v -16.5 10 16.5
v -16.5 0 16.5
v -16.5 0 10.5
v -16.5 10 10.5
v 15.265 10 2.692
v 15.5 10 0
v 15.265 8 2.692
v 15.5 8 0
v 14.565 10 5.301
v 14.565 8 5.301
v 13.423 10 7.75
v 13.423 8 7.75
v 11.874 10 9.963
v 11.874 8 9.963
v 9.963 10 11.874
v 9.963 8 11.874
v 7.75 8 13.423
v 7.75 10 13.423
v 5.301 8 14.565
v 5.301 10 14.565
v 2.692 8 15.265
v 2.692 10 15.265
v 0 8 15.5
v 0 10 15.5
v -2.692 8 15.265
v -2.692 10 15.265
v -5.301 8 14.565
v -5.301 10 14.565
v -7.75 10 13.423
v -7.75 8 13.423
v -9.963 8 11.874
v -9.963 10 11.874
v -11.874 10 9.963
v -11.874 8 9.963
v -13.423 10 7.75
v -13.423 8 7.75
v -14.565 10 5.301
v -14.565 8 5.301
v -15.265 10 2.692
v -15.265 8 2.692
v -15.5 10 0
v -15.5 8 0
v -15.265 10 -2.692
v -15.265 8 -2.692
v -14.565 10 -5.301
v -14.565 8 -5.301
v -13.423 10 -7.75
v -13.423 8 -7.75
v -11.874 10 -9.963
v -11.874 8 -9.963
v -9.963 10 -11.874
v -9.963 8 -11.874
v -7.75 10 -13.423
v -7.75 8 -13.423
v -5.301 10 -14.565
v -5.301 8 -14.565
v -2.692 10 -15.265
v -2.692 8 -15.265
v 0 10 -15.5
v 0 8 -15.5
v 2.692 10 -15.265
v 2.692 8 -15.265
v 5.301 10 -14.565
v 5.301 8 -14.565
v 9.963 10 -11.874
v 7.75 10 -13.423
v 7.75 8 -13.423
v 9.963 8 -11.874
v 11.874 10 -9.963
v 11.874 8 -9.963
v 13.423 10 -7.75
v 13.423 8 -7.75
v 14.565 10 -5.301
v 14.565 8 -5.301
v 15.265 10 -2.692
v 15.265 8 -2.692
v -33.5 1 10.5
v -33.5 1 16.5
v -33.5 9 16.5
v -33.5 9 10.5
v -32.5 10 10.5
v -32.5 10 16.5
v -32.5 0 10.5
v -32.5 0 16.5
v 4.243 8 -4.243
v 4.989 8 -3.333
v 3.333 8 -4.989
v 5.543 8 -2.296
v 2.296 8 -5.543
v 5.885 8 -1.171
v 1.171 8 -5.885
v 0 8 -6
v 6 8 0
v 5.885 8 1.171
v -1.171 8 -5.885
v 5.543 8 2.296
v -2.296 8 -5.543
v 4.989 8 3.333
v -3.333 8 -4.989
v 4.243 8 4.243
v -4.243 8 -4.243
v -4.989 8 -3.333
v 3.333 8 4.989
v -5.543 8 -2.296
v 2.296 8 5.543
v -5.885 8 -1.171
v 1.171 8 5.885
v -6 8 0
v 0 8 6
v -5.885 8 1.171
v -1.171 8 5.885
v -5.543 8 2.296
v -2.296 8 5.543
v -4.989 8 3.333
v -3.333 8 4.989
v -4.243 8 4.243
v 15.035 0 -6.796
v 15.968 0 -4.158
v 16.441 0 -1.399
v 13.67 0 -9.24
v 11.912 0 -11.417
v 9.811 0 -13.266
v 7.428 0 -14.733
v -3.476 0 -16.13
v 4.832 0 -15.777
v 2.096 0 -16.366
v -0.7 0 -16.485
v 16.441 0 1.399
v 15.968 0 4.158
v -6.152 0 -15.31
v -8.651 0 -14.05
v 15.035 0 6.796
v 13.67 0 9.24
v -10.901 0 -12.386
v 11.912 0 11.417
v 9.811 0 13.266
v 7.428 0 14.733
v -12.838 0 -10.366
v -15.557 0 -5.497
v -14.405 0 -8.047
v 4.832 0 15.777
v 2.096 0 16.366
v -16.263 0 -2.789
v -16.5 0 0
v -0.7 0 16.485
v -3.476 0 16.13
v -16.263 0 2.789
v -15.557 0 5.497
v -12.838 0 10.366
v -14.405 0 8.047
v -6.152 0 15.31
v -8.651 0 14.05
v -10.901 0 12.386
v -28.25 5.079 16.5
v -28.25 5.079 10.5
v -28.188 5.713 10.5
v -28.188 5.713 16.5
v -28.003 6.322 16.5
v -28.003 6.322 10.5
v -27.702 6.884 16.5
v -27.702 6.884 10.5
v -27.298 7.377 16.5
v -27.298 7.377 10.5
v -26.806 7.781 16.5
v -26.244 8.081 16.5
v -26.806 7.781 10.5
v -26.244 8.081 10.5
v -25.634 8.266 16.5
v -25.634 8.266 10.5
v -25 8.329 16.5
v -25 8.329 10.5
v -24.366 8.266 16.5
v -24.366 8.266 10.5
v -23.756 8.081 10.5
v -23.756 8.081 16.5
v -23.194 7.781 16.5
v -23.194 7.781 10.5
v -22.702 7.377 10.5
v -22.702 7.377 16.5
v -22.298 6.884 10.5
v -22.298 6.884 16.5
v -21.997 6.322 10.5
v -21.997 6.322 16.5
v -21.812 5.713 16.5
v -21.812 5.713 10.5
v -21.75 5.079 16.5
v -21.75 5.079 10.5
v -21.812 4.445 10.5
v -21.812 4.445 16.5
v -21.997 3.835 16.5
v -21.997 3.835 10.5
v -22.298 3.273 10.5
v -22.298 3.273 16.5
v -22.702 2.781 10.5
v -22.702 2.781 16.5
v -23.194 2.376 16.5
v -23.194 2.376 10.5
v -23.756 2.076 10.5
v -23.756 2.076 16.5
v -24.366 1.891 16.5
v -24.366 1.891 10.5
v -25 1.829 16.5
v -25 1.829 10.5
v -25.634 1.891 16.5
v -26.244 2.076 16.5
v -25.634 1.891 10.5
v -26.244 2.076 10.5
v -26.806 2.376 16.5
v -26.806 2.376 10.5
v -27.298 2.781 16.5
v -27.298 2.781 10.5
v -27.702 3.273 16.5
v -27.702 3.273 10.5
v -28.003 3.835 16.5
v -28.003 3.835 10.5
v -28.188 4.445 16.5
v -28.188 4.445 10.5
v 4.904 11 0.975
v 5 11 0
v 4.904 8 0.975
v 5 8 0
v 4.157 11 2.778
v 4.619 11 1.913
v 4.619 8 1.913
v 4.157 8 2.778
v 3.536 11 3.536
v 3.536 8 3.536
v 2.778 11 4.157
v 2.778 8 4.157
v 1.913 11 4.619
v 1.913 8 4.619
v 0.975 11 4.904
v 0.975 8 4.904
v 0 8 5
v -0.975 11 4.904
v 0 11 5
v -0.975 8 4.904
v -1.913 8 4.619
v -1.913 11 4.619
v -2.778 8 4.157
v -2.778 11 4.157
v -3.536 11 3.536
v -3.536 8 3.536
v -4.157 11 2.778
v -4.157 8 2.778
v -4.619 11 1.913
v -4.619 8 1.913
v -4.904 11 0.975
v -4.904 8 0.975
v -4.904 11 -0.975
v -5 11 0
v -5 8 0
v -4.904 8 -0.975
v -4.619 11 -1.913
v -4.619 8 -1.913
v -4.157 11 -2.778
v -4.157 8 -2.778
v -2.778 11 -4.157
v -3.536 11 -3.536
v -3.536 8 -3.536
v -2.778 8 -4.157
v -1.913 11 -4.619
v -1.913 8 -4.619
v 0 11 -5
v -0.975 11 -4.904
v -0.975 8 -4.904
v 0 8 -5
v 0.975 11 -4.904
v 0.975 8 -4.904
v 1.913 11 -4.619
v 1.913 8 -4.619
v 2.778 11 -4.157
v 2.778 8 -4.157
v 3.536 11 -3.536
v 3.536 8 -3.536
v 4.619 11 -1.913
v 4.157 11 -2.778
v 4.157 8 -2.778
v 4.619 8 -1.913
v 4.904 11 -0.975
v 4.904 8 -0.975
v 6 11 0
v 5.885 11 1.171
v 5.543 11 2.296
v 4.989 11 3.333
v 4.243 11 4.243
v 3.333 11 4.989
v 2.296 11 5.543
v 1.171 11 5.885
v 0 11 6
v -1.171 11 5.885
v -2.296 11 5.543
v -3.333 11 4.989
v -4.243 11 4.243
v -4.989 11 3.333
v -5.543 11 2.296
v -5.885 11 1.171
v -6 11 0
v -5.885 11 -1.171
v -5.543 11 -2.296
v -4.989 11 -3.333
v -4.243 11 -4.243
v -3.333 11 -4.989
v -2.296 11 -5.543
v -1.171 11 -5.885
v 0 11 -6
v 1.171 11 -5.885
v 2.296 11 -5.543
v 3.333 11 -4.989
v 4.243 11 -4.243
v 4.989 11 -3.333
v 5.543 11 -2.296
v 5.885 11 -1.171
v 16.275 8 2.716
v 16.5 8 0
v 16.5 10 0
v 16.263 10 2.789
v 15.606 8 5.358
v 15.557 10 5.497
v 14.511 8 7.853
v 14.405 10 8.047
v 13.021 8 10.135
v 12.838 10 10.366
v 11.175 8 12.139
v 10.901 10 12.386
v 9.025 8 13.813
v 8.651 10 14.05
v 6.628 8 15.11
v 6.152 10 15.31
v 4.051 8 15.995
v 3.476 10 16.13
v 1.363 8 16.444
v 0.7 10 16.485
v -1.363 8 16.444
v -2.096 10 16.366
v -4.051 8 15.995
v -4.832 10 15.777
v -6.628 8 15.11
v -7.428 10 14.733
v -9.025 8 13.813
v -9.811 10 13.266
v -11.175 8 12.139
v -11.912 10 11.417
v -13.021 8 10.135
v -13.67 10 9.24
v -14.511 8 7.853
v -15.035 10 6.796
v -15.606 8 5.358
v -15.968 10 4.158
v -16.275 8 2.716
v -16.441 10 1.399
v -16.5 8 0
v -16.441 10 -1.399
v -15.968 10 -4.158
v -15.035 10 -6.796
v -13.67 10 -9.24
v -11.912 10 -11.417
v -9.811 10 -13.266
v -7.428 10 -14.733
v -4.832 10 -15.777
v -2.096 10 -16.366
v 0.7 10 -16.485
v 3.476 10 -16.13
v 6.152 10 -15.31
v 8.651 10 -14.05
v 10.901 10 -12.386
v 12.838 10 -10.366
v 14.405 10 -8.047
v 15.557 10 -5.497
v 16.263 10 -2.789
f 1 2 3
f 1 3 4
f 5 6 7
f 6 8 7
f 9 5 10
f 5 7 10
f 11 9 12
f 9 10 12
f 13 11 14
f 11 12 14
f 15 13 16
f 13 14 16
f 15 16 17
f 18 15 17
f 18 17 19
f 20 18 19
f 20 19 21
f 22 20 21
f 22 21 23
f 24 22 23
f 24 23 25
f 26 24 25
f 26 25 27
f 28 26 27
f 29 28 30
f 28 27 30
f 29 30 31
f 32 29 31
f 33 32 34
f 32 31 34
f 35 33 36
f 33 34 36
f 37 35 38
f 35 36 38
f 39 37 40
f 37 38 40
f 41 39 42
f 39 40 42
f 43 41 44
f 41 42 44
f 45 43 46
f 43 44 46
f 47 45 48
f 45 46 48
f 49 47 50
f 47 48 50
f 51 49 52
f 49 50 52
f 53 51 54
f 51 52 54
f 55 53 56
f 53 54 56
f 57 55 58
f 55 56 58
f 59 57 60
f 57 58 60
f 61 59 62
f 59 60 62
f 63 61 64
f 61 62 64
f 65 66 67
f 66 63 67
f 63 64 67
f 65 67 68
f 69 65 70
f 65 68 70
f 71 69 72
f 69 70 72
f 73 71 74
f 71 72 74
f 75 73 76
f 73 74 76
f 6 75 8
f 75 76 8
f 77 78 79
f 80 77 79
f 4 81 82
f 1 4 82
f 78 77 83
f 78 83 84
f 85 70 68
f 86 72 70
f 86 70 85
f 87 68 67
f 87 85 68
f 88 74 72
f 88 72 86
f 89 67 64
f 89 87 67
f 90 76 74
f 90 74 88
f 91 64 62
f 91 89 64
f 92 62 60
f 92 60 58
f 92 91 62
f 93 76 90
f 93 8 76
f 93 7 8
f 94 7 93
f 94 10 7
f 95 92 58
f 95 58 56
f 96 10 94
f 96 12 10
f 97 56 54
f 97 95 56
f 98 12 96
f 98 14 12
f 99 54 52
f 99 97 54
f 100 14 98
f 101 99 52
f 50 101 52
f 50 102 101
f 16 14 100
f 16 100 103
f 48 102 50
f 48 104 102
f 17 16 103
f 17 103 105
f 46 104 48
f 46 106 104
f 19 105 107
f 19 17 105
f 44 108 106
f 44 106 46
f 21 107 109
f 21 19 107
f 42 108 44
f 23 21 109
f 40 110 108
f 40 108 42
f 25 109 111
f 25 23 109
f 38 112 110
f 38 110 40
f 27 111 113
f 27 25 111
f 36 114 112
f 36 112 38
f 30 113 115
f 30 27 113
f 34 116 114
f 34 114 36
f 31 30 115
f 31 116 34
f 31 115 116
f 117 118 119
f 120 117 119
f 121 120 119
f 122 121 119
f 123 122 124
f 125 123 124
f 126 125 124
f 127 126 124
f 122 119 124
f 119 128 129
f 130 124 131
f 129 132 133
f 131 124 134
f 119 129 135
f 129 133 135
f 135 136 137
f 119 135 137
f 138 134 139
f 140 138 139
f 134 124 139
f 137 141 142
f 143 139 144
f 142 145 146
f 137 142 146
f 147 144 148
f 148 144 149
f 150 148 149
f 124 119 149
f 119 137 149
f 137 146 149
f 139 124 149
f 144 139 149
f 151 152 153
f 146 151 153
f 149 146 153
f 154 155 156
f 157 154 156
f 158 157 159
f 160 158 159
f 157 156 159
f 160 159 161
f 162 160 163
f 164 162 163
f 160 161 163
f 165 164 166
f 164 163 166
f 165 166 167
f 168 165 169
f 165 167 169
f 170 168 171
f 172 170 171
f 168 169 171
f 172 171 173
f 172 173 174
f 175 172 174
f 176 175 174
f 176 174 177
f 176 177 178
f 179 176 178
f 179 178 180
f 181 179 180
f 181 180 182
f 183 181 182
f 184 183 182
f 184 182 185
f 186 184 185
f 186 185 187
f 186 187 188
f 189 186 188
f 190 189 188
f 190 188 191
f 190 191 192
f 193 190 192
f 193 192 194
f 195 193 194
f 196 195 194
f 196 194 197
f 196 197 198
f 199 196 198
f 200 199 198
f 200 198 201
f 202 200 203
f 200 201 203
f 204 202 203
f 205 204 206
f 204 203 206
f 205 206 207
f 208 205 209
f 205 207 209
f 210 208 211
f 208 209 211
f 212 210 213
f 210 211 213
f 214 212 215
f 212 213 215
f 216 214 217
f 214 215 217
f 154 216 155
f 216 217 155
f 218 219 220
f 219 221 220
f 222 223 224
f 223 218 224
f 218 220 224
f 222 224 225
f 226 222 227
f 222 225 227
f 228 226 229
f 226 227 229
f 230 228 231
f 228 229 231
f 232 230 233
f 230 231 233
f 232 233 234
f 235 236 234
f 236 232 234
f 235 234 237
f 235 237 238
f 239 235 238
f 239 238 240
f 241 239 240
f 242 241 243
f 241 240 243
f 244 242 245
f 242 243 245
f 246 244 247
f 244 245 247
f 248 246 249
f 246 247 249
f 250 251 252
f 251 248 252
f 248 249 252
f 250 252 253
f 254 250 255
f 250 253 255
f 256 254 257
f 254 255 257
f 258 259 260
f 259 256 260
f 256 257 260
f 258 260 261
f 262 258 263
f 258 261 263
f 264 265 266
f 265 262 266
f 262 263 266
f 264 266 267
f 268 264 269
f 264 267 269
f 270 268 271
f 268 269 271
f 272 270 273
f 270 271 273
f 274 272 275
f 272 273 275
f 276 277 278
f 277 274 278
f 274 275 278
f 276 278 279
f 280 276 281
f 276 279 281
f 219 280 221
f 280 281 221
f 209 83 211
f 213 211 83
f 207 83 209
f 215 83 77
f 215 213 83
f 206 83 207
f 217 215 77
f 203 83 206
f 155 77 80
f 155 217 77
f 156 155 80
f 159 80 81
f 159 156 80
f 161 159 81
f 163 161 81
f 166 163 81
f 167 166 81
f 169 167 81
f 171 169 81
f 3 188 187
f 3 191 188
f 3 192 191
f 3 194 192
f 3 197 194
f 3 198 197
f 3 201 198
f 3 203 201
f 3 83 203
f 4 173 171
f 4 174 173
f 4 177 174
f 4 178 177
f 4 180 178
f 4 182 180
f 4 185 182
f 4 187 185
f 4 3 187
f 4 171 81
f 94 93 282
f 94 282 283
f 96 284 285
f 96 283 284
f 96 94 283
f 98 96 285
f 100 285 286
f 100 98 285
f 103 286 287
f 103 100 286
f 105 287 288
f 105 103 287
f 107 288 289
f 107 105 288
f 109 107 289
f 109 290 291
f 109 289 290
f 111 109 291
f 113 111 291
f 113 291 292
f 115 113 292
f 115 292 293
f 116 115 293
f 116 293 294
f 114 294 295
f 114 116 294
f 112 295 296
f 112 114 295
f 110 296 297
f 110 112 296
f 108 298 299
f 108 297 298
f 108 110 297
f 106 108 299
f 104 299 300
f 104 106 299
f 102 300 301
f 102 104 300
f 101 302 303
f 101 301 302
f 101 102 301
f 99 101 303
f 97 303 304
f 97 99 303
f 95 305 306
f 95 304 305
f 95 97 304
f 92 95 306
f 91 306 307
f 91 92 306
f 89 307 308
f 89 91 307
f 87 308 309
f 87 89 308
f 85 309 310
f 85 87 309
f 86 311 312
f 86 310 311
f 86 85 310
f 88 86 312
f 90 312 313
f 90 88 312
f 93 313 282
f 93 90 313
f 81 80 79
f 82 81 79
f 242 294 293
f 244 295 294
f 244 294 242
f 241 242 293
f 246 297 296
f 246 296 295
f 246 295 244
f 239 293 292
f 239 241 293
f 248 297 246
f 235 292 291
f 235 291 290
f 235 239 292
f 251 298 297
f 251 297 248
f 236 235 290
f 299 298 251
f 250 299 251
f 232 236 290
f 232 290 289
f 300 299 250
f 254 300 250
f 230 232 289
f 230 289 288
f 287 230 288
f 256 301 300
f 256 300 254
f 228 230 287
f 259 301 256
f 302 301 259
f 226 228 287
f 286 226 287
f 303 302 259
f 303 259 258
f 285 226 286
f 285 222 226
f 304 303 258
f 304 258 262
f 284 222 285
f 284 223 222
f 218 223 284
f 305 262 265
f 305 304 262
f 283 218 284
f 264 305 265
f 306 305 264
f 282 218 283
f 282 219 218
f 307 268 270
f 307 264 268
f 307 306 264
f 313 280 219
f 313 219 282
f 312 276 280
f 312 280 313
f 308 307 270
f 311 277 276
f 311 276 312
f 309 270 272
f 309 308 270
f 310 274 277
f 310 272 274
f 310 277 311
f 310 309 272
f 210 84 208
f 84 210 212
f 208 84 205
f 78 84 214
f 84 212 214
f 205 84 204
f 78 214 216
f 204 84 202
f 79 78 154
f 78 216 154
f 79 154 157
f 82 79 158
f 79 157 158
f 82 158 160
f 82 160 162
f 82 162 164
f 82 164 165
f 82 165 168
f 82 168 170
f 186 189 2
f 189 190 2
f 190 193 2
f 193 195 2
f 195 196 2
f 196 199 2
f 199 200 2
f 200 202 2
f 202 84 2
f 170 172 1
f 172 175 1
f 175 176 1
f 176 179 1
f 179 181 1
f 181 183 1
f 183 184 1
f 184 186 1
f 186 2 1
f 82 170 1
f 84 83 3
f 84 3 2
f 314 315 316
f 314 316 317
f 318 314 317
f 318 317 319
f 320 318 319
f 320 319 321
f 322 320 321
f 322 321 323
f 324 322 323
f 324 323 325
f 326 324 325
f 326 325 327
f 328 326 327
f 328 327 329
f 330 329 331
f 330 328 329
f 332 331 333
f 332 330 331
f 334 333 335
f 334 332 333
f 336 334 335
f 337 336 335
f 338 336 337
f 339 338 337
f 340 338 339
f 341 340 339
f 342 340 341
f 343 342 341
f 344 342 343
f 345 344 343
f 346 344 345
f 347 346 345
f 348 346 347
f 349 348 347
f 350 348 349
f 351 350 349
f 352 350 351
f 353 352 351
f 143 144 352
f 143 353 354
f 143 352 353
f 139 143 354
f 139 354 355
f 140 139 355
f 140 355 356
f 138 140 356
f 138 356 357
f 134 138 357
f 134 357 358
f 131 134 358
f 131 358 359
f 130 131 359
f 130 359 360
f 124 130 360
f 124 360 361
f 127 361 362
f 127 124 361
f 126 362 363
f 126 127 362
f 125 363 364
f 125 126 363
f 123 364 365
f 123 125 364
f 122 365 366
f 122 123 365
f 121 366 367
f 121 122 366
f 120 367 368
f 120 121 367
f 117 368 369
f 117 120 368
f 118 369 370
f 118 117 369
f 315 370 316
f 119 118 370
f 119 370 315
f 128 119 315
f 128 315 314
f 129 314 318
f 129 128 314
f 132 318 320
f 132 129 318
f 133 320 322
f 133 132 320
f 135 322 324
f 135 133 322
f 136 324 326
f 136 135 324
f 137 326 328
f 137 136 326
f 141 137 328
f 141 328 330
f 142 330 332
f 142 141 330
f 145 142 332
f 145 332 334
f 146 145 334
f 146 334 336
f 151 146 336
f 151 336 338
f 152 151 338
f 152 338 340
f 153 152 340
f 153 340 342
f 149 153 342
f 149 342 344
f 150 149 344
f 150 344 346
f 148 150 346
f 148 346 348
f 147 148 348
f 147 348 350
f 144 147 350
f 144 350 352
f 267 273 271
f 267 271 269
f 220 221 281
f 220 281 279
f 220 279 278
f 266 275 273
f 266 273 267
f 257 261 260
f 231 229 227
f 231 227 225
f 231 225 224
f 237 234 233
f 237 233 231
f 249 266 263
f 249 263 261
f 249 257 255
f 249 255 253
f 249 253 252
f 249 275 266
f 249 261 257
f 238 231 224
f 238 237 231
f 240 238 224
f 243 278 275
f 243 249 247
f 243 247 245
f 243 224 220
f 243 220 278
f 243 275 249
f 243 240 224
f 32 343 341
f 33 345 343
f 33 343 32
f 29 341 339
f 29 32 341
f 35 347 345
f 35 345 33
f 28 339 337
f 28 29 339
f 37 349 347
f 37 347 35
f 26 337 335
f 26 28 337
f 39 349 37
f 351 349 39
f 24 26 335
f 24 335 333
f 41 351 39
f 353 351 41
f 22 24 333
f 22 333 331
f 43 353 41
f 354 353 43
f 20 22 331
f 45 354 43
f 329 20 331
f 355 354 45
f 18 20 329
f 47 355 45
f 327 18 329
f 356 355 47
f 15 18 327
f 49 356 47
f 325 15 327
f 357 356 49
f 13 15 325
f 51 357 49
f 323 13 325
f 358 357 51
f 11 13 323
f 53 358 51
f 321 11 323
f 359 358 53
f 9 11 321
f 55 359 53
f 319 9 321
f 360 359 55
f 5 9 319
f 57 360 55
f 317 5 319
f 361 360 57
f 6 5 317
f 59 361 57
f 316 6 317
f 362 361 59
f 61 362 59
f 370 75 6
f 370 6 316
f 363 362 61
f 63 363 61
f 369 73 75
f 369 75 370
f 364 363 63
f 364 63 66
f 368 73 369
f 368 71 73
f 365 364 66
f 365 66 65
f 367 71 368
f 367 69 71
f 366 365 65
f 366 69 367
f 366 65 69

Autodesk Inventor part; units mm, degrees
ref_plane "XZ Plane" through (0, 0, 0) normal (0, 1, 0) x (-1, 0, 0)
ref_plane "XY Plane" through (0, 0, 0) normal (0, 0, 1) x (1, 0, 0)
sketch "Sketch1" plane through (0, 0, 0) normal (0, 1, 0) x (-1, 0, 0)
  circle A0 centre (0, 0) radius 16.5
  dimension "d0" = 33
extrude "Extrusion1" add sketch "Sketch1" along normal blind 8
sketch "Sketch2" plane through (0, 8, 0) normal (0, 1, 0) x (1, 0, 0)
  circle A0 centre (0, 0) radius 16.5
  circle A1 centre (0, 0) radius 15.5
  dimension "d4" = 31
extrude "Extrusion2" add sketch "Sketch2" along normal blind 2
sketch "Sketch3" plane through (0, 8, 0) normal (0, 1, 0) x (1, 0, 0)
  circle A0 centre (0, 0) radius 5
  circle A1 centre (0, 0) radius 6
  dimension "d7" = 10
  dimension "d8" = 12
extrude "Extrusion3" add sketch "Sketch3" along normal blind 3
ref_plane "Work Plane1" through (-16.5, 0, 0) normal (1, 0, 0) x (0, 1, 0)
sketch "Sketch4" plane through (-16.5, 0, 0) normal (1, 0, 0) x (0, 1, 0)
  line L0 (0, 16.5) -> (10, 16.5) projected
  line L1 (0, -16.5) -> (0, 16.5) projected
  line L2 (10, 16.5) -> (0, 16.5)
  line L3 (0, 16.5) -> (0, 10.5)
  line L4 (0, 10.5) -> (10, 10.5)
  line L5 (10, 10.5) -> (10, 16.5)
  point P0 (0, 0)
  dimension "d12" = 6
extrude "Extrusion4" add sketch "Sketch4" against normal blind 17
chamfer "Chamfer1" distance 1 angle 45 2 edges at (-33.5, 10, 13.5) (-33.5, 0, 13.5)
sketch "Sketch5" plane through (-16.5, 0, 10.5) normal (0, 0, -1) x (-1, 0, 0)
  circle A0 centre (8.5, 5.0786) radius 3.25
  point P0 (-16.5, 0)
  dimension "d18" = 6.5
extrude "Extrusion5" cut sketch "Sketch5" against normal blind 7
properties part number "Chumacera con rodamiento 10 mm kp000"
